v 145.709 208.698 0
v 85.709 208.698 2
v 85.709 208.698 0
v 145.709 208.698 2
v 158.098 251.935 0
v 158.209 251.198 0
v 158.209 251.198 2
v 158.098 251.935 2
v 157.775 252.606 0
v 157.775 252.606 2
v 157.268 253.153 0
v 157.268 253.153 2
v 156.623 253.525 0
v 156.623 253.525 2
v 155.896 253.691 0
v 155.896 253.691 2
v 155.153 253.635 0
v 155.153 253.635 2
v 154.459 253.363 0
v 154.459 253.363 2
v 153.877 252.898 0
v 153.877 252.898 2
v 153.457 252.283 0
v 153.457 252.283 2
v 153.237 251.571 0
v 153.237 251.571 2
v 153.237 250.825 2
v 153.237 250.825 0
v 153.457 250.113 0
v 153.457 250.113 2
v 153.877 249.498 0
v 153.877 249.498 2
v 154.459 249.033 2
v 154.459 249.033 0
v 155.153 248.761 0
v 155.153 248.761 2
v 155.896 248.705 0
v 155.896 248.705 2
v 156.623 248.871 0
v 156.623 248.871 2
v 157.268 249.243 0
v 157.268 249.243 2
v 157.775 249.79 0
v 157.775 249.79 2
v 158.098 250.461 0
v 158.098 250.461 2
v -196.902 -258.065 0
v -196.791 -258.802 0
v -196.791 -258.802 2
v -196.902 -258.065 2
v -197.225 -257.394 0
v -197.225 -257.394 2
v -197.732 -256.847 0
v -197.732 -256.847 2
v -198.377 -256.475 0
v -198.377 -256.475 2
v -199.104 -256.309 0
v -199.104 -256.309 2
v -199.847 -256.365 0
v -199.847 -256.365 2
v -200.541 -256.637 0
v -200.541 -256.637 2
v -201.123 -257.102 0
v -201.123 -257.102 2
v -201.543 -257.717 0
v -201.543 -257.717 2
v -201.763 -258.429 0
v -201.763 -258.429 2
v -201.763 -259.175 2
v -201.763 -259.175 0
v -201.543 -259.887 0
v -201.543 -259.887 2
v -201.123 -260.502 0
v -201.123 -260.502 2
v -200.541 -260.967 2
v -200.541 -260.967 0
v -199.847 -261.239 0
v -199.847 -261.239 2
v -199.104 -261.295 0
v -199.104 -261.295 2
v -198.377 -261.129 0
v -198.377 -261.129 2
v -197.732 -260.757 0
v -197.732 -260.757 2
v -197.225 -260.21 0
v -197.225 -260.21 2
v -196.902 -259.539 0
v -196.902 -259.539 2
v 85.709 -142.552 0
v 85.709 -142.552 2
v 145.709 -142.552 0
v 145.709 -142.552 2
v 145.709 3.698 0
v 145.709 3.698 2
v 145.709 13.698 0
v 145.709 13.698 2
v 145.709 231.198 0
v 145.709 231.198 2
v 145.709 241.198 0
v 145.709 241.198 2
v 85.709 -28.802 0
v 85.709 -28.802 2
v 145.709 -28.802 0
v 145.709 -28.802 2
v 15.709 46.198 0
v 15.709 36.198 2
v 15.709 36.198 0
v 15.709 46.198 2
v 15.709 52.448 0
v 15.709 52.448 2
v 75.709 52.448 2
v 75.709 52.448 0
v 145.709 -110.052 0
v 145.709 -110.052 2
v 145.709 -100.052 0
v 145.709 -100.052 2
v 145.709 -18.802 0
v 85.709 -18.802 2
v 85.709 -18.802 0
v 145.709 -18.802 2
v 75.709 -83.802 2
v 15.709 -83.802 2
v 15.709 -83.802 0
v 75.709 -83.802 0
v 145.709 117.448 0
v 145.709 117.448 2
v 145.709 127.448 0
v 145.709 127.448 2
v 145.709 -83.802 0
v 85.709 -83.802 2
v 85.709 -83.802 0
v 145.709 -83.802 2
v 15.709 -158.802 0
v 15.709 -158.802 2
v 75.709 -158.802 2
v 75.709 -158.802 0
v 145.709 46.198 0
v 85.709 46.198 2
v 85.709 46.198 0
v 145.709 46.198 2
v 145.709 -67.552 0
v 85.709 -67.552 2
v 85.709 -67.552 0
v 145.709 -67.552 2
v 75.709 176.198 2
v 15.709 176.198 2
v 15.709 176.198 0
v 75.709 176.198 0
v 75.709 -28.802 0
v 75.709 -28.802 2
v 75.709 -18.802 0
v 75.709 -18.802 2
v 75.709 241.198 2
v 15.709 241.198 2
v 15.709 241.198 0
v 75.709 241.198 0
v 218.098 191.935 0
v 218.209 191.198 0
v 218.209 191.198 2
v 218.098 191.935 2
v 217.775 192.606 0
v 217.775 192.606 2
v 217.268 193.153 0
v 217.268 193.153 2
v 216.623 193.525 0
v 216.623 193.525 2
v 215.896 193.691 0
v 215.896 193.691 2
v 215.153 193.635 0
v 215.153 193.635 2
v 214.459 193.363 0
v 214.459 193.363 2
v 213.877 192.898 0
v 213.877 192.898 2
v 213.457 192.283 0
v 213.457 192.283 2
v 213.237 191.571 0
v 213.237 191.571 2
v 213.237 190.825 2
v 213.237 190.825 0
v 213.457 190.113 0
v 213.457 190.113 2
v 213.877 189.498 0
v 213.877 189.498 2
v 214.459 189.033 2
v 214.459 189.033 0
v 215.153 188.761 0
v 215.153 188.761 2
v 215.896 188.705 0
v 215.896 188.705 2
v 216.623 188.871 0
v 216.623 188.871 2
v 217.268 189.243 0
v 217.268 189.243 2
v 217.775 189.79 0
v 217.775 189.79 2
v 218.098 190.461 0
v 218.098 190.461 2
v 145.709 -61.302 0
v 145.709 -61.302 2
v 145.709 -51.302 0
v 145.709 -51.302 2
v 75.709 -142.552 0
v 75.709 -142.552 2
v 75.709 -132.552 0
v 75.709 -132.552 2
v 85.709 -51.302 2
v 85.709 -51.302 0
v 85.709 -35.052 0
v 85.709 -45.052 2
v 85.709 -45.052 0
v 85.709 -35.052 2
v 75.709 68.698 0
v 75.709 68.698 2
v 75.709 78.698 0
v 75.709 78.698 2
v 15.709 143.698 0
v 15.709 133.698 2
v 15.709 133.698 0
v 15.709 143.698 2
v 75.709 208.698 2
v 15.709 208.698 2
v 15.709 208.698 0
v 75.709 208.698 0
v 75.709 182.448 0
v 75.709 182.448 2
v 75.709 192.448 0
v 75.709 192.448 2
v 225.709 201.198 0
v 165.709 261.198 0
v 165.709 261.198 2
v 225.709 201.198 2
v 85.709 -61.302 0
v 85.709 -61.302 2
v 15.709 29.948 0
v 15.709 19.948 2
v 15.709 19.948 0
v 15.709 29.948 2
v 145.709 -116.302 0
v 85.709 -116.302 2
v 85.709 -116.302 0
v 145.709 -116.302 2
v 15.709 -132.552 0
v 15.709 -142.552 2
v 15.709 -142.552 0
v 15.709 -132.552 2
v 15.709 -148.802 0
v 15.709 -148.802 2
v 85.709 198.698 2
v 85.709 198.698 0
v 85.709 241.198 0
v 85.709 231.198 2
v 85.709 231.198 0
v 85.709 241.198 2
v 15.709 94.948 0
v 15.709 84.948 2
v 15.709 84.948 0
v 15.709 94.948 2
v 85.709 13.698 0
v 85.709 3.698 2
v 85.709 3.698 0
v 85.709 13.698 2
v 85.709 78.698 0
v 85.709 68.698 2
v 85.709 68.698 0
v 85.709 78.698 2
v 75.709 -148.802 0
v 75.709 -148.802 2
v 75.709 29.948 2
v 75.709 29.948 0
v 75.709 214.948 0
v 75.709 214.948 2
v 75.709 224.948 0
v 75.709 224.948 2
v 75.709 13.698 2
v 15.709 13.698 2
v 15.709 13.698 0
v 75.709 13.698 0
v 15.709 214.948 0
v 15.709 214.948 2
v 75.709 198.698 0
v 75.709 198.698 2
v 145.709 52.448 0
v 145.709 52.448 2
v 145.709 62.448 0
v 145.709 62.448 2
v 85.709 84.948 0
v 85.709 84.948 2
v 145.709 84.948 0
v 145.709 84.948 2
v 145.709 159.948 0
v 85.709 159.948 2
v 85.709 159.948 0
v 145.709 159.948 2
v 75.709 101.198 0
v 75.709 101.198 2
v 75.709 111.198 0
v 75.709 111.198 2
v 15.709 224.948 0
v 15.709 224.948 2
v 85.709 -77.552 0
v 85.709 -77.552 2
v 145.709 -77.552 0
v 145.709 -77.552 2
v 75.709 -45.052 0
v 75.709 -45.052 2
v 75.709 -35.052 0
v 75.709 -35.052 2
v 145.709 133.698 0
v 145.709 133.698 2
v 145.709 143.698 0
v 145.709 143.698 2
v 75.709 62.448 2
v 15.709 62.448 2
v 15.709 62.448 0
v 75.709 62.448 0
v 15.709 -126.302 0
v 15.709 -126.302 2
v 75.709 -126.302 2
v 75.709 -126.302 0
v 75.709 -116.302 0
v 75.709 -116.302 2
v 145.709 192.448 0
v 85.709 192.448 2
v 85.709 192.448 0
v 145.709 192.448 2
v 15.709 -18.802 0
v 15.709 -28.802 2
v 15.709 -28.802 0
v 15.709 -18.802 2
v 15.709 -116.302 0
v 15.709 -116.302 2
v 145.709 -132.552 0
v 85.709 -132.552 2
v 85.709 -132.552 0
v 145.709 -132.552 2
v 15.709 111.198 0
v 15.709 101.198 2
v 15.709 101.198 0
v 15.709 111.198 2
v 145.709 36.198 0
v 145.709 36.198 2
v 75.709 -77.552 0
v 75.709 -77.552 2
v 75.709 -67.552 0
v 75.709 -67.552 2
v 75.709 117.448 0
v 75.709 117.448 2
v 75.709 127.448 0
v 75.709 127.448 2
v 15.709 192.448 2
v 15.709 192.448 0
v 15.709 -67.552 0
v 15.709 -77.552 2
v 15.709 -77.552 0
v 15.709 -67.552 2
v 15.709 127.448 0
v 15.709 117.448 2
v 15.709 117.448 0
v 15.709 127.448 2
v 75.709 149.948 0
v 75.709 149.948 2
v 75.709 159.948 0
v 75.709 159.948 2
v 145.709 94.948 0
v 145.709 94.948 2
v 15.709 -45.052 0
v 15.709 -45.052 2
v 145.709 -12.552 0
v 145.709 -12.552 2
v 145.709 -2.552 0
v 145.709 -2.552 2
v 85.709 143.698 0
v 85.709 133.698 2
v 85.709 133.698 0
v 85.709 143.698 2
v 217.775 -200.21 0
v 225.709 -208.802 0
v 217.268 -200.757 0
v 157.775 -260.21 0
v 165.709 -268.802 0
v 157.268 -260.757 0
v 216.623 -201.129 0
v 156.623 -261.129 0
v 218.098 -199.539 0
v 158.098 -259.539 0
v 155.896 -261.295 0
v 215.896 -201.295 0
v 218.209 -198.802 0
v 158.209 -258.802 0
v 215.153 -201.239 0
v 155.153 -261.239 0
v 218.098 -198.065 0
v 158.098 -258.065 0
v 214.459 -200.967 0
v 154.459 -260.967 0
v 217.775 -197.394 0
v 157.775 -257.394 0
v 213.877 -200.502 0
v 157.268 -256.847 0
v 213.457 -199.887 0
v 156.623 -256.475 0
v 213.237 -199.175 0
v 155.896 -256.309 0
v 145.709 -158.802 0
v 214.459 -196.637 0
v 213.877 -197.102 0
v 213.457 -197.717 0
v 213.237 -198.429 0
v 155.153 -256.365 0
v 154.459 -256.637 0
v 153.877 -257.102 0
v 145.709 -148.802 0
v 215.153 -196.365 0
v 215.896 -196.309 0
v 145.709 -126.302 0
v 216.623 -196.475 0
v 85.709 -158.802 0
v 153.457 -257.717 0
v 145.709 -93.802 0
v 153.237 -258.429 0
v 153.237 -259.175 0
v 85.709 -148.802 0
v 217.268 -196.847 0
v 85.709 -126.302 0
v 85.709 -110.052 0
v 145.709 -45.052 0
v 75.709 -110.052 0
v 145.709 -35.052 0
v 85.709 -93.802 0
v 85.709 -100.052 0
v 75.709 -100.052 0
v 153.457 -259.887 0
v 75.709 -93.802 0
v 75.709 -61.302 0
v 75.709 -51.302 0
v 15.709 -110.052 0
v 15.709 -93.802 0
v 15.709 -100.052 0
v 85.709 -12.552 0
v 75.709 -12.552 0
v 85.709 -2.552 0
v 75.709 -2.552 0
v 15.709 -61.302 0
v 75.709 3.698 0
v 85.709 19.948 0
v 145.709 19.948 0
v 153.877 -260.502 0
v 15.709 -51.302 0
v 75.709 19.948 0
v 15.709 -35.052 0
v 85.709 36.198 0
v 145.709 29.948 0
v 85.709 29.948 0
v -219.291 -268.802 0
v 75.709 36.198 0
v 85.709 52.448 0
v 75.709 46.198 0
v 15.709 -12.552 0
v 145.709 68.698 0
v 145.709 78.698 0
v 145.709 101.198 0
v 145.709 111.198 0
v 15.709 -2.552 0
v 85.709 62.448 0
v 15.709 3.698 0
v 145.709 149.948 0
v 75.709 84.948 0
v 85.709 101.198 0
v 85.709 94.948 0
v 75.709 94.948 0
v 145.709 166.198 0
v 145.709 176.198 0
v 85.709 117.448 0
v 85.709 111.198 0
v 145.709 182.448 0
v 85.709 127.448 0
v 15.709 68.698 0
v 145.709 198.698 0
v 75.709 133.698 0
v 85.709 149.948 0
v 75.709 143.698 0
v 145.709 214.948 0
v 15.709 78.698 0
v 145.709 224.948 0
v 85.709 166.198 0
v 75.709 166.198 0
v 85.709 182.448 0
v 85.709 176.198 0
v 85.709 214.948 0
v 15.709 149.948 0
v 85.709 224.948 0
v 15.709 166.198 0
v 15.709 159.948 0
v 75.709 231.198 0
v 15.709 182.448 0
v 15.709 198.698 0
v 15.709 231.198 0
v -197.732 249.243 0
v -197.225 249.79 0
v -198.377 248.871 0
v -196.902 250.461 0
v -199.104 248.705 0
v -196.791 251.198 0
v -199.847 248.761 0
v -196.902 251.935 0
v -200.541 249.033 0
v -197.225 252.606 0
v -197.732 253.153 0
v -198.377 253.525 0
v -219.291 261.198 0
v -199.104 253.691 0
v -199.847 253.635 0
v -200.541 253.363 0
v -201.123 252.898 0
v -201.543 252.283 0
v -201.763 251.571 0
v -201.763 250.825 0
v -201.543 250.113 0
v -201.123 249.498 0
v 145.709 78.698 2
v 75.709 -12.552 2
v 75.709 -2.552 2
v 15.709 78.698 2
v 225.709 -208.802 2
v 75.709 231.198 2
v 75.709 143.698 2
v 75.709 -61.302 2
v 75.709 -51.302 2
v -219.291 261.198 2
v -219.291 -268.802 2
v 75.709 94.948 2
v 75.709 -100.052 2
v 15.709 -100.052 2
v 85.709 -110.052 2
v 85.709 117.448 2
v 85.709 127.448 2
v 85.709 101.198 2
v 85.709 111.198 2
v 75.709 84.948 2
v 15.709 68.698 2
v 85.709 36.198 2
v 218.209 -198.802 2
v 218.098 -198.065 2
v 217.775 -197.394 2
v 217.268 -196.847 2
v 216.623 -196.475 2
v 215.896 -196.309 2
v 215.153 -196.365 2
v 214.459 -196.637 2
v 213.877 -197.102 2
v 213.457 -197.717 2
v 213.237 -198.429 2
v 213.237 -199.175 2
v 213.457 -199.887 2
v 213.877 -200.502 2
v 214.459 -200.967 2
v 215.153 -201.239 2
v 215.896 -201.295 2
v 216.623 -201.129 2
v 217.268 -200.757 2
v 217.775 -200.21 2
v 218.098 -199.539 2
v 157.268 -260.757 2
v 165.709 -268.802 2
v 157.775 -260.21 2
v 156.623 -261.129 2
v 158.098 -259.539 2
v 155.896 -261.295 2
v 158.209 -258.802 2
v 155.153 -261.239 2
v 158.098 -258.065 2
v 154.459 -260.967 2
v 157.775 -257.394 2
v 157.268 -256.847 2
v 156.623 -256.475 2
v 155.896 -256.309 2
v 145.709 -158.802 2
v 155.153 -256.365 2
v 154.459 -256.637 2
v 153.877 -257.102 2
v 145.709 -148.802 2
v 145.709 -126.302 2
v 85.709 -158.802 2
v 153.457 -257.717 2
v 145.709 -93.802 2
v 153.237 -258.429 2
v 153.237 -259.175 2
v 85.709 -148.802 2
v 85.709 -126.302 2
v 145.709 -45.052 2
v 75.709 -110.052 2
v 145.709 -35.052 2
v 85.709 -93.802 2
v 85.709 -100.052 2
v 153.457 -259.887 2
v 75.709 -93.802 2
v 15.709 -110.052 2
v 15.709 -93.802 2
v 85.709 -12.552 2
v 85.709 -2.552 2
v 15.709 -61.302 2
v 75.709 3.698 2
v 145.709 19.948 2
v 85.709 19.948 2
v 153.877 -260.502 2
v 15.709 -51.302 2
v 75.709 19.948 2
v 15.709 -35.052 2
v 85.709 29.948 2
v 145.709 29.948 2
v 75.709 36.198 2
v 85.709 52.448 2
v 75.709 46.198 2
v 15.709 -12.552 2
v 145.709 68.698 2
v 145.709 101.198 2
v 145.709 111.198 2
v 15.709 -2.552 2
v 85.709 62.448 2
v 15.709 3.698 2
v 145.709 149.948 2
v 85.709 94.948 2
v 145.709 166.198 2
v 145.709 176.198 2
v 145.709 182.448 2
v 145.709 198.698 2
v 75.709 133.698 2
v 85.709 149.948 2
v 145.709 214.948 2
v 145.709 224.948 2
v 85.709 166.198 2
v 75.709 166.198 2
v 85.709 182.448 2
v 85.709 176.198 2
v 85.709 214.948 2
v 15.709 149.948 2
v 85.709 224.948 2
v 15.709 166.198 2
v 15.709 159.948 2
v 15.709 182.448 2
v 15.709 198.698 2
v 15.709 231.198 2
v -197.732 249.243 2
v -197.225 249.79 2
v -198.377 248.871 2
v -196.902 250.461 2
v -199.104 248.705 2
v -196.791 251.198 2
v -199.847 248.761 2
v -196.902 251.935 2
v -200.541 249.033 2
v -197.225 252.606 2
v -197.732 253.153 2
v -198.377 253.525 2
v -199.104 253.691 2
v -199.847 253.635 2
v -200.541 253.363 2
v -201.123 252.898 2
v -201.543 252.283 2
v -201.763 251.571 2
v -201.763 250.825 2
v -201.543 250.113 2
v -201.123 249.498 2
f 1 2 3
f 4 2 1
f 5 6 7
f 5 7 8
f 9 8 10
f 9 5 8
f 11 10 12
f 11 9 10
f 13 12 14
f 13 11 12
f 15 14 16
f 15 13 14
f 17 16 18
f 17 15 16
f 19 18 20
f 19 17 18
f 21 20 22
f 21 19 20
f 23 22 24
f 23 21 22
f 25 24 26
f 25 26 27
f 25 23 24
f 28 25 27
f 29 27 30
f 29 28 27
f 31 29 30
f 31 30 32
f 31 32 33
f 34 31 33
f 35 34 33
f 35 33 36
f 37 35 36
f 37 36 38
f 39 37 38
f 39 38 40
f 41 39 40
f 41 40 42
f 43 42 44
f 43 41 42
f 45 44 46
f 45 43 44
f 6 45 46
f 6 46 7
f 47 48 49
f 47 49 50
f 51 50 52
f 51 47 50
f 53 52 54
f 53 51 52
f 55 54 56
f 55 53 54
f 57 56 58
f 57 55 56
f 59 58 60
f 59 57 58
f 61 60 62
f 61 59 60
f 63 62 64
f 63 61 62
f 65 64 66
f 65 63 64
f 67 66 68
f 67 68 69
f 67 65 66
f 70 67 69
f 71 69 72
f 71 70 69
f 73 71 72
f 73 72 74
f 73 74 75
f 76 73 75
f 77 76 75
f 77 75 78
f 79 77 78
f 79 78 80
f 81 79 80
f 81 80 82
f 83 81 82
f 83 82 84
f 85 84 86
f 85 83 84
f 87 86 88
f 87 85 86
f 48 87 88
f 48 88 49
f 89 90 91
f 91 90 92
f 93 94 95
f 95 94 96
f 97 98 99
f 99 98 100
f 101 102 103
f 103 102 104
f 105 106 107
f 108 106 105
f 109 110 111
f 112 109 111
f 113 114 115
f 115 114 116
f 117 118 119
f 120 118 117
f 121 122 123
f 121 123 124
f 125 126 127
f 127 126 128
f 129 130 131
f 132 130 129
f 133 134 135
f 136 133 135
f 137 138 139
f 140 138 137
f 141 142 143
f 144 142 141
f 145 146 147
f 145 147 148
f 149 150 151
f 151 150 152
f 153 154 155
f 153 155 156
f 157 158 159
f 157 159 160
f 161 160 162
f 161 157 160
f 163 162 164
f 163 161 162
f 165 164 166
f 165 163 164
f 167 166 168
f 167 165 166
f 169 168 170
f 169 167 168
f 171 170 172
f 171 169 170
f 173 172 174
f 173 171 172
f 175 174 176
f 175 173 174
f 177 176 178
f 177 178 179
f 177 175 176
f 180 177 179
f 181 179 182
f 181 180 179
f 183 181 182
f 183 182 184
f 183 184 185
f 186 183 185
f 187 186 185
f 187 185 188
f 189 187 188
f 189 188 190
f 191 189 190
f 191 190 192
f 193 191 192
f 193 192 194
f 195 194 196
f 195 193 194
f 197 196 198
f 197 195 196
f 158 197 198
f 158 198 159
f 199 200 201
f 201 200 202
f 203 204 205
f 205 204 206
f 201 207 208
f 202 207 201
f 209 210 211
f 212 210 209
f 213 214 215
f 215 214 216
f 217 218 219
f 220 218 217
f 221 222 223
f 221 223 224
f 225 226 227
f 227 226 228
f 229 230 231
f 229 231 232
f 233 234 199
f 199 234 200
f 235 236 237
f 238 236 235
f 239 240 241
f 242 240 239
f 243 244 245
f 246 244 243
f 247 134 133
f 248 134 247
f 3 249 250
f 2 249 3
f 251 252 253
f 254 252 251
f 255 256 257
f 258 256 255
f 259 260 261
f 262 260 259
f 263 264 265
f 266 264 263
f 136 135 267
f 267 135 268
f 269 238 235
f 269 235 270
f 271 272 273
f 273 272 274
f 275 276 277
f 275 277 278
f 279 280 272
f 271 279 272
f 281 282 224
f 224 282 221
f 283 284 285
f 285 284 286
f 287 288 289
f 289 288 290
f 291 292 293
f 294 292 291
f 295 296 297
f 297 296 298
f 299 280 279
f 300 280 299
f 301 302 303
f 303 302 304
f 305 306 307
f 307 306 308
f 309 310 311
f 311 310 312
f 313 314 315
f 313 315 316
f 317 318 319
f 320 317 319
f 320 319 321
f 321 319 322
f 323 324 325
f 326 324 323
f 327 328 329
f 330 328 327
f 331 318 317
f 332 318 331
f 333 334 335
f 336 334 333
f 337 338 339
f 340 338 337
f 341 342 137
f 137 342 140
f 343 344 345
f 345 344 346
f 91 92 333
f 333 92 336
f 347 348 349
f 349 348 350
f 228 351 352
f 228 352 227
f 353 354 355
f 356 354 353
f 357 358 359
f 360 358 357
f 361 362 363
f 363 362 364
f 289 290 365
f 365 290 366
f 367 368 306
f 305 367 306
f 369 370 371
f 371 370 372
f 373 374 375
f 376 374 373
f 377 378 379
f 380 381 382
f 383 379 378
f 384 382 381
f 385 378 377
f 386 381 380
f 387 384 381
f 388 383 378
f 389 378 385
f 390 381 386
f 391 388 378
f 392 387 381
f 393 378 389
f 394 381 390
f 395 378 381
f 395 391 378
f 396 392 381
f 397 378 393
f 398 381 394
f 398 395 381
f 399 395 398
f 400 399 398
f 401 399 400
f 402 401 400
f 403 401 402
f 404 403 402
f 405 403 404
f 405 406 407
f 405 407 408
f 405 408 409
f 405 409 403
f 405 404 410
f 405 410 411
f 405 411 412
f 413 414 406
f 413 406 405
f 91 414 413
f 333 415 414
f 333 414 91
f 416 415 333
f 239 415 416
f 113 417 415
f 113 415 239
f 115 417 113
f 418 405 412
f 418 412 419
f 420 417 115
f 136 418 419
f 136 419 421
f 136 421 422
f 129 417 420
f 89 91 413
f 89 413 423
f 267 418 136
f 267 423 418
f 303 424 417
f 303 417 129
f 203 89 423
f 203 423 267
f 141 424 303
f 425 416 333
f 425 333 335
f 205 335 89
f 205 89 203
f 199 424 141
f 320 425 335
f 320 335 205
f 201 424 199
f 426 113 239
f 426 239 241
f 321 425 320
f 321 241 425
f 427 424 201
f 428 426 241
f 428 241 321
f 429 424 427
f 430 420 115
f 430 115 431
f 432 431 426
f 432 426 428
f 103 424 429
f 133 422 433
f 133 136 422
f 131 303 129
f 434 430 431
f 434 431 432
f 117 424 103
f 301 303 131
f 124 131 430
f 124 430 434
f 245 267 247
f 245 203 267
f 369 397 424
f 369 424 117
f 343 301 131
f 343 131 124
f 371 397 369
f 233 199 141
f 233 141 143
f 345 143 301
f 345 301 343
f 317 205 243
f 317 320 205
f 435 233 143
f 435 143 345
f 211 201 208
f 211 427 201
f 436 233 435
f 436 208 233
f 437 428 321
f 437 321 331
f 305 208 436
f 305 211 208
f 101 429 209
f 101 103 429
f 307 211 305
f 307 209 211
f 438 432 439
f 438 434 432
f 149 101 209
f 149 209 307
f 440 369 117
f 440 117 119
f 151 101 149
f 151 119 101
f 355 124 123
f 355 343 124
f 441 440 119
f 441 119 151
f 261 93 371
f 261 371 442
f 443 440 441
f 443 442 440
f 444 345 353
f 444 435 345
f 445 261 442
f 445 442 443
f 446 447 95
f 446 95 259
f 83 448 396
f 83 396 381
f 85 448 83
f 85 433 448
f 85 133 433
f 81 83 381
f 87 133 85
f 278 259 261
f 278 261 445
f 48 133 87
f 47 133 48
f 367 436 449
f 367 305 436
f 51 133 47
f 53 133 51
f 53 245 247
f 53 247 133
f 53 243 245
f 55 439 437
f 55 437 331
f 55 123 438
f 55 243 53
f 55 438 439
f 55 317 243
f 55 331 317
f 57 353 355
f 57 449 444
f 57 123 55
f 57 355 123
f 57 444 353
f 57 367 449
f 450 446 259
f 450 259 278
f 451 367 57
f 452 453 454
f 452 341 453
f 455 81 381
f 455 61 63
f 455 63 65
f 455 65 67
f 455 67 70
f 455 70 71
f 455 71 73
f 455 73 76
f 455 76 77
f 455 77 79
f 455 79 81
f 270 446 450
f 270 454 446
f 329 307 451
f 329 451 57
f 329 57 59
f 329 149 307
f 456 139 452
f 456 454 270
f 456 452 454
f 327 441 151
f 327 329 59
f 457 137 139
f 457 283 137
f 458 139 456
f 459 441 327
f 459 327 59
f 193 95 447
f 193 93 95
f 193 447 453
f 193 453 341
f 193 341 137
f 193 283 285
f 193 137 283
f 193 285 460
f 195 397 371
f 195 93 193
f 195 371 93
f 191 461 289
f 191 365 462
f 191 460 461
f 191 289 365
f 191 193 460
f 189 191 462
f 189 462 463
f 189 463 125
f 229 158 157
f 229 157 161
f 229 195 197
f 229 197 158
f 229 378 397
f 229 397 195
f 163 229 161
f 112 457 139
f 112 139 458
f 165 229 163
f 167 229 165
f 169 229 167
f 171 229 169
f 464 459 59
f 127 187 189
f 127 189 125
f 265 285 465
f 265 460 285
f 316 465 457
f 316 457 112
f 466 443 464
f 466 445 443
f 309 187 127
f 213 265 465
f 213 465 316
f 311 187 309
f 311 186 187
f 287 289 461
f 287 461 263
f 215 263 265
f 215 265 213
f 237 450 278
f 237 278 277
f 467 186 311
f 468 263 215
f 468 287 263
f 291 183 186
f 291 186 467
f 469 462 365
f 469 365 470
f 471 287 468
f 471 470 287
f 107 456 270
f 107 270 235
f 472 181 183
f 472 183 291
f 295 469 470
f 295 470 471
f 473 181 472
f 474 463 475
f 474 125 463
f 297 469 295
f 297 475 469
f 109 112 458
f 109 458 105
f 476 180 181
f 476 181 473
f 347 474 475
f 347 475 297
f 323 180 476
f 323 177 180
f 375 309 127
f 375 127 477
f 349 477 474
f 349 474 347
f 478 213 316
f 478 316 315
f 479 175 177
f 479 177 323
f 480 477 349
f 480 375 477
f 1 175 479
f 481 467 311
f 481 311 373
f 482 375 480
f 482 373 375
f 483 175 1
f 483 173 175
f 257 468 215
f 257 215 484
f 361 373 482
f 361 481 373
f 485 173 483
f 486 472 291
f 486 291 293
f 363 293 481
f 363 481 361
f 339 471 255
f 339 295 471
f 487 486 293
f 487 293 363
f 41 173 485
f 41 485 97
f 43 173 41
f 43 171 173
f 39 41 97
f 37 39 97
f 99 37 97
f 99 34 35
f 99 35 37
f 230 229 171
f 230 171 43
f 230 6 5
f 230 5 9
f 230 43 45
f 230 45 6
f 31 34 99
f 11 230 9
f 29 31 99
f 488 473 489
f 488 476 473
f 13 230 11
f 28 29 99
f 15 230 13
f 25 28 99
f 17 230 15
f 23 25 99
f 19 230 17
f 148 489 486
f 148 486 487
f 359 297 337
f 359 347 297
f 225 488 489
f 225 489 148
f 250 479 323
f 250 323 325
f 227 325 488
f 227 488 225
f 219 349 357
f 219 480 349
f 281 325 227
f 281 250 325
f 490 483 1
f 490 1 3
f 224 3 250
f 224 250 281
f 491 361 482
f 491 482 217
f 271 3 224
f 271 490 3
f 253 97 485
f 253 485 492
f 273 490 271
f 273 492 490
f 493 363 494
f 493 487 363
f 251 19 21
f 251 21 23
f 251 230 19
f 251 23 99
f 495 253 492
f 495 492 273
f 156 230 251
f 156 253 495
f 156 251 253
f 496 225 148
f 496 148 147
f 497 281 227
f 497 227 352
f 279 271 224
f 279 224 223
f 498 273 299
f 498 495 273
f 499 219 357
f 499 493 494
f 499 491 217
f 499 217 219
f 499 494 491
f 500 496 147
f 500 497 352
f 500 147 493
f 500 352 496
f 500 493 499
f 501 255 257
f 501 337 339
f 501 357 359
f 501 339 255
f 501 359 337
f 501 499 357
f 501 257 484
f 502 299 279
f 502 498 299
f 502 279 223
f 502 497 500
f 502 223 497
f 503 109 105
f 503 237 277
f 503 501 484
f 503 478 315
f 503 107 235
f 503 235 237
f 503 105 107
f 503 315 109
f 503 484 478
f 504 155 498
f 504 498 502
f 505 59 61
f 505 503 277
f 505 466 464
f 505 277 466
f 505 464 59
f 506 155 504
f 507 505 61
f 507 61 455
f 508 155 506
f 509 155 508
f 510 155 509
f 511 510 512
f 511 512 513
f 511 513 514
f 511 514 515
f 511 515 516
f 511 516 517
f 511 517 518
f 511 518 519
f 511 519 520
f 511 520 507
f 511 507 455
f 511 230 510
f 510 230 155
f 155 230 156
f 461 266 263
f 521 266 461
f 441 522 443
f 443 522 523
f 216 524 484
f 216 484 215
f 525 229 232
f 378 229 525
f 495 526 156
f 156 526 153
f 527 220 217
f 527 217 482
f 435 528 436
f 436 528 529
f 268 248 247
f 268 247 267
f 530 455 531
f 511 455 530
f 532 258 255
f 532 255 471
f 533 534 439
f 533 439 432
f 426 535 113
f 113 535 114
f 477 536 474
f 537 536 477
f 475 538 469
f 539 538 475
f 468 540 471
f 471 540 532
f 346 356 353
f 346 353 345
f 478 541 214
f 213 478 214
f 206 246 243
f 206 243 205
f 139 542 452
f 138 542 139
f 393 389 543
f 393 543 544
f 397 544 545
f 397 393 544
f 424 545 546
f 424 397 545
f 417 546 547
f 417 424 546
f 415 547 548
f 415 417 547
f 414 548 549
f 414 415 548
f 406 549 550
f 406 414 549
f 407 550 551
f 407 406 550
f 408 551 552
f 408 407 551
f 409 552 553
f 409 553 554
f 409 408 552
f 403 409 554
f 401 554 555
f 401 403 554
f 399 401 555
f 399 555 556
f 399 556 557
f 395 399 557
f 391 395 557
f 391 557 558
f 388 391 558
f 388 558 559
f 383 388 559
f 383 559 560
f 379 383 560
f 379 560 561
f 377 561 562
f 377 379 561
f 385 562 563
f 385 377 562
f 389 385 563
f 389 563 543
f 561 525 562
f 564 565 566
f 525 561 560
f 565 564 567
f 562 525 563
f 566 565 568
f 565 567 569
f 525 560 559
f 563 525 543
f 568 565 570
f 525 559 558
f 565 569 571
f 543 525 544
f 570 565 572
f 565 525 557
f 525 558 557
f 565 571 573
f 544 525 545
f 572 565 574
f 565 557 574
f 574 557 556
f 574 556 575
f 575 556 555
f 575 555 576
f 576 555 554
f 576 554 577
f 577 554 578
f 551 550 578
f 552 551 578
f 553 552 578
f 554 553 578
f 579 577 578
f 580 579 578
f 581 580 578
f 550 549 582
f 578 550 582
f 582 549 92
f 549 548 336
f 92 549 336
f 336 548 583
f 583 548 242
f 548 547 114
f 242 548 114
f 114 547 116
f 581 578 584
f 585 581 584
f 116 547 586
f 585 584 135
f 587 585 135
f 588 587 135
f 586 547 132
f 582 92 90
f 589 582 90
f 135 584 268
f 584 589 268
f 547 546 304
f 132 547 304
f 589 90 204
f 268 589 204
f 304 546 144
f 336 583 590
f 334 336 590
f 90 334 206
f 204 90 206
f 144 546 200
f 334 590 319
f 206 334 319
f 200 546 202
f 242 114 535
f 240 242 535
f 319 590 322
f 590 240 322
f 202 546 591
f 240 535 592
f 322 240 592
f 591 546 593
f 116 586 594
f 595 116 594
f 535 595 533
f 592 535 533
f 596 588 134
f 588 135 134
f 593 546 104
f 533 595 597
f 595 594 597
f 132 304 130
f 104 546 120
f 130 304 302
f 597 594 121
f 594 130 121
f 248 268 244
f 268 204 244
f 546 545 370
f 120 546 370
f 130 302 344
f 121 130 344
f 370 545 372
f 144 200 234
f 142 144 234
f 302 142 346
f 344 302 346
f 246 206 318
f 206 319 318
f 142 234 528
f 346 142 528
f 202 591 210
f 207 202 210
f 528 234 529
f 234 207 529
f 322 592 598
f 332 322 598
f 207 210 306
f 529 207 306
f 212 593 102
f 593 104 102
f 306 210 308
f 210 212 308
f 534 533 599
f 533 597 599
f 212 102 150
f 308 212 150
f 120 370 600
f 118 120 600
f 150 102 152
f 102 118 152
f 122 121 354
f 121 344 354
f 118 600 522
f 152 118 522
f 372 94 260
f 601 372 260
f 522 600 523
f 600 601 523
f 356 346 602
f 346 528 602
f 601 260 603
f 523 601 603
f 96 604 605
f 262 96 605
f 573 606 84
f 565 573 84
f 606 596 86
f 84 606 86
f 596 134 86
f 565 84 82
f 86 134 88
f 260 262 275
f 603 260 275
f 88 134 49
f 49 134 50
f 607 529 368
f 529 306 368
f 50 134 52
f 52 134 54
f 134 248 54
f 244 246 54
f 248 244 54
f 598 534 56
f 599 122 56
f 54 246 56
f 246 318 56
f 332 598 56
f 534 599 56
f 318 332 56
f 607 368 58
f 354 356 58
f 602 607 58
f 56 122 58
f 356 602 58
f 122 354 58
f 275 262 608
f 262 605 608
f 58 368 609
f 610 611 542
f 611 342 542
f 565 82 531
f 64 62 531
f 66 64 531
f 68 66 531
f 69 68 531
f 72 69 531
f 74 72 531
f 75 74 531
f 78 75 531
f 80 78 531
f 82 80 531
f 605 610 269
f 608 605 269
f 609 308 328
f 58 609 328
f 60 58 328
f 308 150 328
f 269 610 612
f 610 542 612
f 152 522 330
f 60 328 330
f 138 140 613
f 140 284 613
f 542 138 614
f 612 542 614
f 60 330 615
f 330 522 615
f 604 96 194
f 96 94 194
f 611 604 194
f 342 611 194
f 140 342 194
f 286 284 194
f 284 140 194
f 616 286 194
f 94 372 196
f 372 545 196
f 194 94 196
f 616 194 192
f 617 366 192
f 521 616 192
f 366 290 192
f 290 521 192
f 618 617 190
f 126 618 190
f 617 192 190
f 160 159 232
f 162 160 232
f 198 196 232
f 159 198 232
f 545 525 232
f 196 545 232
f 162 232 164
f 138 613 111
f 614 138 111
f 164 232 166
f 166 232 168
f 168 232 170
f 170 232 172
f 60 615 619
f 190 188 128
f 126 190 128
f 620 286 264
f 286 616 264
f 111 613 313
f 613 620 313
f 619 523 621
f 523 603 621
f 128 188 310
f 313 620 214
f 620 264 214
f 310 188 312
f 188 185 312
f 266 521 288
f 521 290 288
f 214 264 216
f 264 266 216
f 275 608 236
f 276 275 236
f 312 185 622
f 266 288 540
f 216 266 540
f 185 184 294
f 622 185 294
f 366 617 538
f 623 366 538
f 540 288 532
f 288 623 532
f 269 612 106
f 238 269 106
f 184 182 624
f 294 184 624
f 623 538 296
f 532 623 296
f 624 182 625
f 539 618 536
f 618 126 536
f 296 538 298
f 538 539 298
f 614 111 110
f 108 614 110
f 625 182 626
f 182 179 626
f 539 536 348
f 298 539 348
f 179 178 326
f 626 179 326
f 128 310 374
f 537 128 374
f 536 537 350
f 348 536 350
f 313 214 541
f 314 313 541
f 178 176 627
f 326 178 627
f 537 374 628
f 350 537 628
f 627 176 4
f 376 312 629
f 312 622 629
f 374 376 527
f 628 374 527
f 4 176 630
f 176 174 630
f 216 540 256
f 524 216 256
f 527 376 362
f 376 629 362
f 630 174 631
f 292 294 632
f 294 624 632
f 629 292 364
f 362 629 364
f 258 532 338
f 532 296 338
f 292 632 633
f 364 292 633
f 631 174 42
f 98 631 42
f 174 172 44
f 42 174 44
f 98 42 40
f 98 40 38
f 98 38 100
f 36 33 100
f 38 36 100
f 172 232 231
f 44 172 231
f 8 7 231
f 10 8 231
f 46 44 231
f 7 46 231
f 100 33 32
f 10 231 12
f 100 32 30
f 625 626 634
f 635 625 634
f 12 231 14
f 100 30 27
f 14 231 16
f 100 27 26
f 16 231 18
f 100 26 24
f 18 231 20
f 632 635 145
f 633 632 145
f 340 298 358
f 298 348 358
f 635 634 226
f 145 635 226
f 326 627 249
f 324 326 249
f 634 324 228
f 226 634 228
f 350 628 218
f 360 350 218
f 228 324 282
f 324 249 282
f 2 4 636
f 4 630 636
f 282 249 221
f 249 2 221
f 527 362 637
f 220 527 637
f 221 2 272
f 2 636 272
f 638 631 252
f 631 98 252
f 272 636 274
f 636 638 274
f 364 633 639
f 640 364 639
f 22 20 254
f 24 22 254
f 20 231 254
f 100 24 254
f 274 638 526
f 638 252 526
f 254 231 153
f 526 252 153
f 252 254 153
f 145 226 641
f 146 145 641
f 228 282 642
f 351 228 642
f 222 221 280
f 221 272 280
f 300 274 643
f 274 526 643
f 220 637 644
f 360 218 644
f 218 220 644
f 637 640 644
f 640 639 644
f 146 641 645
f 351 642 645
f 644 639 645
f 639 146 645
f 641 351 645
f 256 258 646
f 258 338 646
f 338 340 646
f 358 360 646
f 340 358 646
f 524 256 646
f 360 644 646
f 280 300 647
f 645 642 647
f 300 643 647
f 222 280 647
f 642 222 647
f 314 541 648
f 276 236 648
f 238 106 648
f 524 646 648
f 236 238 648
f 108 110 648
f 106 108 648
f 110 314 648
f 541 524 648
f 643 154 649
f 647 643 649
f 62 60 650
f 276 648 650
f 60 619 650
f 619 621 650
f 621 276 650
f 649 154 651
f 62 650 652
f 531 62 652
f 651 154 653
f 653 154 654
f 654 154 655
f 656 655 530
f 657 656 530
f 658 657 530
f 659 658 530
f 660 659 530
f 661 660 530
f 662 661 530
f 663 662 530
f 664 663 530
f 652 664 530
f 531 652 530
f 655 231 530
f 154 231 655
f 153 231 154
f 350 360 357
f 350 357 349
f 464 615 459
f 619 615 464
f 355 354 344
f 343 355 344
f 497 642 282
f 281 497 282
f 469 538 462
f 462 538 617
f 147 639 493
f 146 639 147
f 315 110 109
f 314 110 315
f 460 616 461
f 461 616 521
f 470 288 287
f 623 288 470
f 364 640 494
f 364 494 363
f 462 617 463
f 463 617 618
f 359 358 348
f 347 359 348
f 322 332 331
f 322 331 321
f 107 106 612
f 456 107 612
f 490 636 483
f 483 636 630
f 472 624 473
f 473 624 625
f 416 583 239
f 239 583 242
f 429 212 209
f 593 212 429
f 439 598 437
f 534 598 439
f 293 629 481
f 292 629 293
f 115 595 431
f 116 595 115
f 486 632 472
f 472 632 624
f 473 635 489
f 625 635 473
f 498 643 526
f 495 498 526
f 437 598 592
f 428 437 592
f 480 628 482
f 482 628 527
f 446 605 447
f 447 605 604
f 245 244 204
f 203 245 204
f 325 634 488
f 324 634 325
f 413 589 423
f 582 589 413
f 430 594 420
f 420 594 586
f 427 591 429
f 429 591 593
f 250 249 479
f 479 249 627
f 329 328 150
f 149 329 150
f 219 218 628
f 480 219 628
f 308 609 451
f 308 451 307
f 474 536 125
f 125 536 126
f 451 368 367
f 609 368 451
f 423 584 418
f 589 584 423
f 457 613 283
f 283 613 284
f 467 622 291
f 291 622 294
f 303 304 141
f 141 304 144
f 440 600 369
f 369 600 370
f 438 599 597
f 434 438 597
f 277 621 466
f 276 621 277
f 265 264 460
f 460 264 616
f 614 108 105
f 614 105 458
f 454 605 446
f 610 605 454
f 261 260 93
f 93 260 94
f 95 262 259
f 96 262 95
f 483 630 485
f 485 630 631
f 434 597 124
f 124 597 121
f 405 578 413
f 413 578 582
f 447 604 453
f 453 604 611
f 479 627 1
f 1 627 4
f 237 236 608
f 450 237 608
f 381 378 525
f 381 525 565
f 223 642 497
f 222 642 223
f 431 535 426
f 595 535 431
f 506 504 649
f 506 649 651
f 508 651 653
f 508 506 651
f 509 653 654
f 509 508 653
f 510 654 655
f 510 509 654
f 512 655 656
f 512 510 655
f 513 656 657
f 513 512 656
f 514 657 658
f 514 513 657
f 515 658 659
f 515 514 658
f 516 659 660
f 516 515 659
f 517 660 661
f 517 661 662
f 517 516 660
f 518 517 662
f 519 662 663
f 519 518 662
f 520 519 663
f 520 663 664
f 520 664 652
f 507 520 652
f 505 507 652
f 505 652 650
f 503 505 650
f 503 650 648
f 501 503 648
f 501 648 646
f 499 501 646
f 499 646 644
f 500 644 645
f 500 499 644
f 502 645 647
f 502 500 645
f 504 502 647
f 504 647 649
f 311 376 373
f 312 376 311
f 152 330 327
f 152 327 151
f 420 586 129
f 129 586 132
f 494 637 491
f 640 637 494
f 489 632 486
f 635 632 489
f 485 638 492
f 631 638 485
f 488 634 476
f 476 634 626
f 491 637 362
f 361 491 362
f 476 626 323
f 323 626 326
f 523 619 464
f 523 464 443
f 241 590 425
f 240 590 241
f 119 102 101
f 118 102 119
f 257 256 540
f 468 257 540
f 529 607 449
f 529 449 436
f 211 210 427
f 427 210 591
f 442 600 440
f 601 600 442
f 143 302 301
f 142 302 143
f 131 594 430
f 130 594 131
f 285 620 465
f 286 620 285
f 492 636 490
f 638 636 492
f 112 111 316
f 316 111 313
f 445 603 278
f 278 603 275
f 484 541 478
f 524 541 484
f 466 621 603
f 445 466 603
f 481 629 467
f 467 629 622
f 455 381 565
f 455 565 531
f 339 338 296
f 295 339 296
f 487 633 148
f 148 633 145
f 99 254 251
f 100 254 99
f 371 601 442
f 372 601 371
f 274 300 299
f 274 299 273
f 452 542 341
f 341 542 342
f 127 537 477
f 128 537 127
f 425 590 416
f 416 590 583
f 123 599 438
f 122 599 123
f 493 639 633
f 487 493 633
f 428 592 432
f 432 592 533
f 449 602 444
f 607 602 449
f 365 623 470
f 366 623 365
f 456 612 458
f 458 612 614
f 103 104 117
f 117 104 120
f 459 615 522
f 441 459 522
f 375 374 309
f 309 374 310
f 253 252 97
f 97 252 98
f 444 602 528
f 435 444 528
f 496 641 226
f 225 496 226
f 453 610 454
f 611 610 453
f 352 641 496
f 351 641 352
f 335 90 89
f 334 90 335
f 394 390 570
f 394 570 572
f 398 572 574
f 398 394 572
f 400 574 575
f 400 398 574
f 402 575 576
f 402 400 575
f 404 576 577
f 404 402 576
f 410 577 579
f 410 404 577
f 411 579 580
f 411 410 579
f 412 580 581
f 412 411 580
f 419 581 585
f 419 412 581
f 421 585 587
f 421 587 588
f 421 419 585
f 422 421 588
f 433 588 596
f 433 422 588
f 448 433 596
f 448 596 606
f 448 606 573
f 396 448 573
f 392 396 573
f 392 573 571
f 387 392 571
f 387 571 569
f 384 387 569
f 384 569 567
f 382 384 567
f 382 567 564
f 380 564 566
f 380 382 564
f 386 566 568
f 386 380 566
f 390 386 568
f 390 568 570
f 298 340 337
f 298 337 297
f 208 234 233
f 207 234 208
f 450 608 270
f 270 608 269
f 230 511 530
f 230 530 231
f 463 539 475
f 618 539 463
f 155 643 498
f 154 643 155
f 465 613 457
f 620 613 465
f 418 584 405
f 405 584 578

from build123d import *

# Parameters (mm, degrees)
SKETCH_R            = 2.5
PAD_DEPTH           = 2
SKETCH001_W         = 60
SKETCH001_H         = 10
POCKET_DEPTH        = 5
LINEARPATTERN_COUNT = 25
LINEARPATTERN_PITCH = 16.25


with BuildPart() as part:
    # Sketch → Pad (new body)
    with BuildSketch(Plane.XY):
        Polygon((-219.290563, 261.197963), (165.709437, 261.197963), (225.709437, 201.197963), (225.709437, -208.802037), (165.709437, -268.802037), (-219.290563, -268.802037), align=None)
        with Locations((155.709437, 251.197963)):
            Circle(SKETCH_R, mode=Mode.SUBTRACT)
        with Locations((215.709437, 191.197963)):
            Circle(SKETCH_R, mode=Mode.SUBTRACT)
        with Locations((215.709437, -198.802037)):
            Circle(SKETCH_R, mode=Mode.SUBTRACT)
        with Locations((155.709437, -258.802037)):
            Circle(SKETCH_R, mode=Mode.SUBTRACT)
        with Locations((-199.290563, 251.197963)):
            Circle(SKETCH_R, mode=Mode.SUBTRACT)
        with Locations((-199.290563, -258.802037)):
            Circle(SKETCH_R, mode=Mode.SUBTRACT)
    extrude(amount=PAD_DEPTH)

    # Sketch001 → Pocket (cut)
    with BuildSketch(Plane.XY.offset(2)):
        with Locations((45.709437, 236.197963)):
            Rectangle(SKETCH001_W, SKETCH001_H)
        with Locations((115.709437, 236.197963)):
            Rectangle(SKETCH001_W, SKETCH001_H)
    pocket = extrude(amount=-POCKET_DEPTH, mode=Mode.SUBTRACT)

    # LinearPattern: Pocket ×25
    with Locations(*[(0, -i * LINEARPATTERN_PITCH, 0) for i in range(1, LINEARPATTERN_COUNT)]):
        add(pocket, mode=Mode.SUBTRACT)


solid = part.part
